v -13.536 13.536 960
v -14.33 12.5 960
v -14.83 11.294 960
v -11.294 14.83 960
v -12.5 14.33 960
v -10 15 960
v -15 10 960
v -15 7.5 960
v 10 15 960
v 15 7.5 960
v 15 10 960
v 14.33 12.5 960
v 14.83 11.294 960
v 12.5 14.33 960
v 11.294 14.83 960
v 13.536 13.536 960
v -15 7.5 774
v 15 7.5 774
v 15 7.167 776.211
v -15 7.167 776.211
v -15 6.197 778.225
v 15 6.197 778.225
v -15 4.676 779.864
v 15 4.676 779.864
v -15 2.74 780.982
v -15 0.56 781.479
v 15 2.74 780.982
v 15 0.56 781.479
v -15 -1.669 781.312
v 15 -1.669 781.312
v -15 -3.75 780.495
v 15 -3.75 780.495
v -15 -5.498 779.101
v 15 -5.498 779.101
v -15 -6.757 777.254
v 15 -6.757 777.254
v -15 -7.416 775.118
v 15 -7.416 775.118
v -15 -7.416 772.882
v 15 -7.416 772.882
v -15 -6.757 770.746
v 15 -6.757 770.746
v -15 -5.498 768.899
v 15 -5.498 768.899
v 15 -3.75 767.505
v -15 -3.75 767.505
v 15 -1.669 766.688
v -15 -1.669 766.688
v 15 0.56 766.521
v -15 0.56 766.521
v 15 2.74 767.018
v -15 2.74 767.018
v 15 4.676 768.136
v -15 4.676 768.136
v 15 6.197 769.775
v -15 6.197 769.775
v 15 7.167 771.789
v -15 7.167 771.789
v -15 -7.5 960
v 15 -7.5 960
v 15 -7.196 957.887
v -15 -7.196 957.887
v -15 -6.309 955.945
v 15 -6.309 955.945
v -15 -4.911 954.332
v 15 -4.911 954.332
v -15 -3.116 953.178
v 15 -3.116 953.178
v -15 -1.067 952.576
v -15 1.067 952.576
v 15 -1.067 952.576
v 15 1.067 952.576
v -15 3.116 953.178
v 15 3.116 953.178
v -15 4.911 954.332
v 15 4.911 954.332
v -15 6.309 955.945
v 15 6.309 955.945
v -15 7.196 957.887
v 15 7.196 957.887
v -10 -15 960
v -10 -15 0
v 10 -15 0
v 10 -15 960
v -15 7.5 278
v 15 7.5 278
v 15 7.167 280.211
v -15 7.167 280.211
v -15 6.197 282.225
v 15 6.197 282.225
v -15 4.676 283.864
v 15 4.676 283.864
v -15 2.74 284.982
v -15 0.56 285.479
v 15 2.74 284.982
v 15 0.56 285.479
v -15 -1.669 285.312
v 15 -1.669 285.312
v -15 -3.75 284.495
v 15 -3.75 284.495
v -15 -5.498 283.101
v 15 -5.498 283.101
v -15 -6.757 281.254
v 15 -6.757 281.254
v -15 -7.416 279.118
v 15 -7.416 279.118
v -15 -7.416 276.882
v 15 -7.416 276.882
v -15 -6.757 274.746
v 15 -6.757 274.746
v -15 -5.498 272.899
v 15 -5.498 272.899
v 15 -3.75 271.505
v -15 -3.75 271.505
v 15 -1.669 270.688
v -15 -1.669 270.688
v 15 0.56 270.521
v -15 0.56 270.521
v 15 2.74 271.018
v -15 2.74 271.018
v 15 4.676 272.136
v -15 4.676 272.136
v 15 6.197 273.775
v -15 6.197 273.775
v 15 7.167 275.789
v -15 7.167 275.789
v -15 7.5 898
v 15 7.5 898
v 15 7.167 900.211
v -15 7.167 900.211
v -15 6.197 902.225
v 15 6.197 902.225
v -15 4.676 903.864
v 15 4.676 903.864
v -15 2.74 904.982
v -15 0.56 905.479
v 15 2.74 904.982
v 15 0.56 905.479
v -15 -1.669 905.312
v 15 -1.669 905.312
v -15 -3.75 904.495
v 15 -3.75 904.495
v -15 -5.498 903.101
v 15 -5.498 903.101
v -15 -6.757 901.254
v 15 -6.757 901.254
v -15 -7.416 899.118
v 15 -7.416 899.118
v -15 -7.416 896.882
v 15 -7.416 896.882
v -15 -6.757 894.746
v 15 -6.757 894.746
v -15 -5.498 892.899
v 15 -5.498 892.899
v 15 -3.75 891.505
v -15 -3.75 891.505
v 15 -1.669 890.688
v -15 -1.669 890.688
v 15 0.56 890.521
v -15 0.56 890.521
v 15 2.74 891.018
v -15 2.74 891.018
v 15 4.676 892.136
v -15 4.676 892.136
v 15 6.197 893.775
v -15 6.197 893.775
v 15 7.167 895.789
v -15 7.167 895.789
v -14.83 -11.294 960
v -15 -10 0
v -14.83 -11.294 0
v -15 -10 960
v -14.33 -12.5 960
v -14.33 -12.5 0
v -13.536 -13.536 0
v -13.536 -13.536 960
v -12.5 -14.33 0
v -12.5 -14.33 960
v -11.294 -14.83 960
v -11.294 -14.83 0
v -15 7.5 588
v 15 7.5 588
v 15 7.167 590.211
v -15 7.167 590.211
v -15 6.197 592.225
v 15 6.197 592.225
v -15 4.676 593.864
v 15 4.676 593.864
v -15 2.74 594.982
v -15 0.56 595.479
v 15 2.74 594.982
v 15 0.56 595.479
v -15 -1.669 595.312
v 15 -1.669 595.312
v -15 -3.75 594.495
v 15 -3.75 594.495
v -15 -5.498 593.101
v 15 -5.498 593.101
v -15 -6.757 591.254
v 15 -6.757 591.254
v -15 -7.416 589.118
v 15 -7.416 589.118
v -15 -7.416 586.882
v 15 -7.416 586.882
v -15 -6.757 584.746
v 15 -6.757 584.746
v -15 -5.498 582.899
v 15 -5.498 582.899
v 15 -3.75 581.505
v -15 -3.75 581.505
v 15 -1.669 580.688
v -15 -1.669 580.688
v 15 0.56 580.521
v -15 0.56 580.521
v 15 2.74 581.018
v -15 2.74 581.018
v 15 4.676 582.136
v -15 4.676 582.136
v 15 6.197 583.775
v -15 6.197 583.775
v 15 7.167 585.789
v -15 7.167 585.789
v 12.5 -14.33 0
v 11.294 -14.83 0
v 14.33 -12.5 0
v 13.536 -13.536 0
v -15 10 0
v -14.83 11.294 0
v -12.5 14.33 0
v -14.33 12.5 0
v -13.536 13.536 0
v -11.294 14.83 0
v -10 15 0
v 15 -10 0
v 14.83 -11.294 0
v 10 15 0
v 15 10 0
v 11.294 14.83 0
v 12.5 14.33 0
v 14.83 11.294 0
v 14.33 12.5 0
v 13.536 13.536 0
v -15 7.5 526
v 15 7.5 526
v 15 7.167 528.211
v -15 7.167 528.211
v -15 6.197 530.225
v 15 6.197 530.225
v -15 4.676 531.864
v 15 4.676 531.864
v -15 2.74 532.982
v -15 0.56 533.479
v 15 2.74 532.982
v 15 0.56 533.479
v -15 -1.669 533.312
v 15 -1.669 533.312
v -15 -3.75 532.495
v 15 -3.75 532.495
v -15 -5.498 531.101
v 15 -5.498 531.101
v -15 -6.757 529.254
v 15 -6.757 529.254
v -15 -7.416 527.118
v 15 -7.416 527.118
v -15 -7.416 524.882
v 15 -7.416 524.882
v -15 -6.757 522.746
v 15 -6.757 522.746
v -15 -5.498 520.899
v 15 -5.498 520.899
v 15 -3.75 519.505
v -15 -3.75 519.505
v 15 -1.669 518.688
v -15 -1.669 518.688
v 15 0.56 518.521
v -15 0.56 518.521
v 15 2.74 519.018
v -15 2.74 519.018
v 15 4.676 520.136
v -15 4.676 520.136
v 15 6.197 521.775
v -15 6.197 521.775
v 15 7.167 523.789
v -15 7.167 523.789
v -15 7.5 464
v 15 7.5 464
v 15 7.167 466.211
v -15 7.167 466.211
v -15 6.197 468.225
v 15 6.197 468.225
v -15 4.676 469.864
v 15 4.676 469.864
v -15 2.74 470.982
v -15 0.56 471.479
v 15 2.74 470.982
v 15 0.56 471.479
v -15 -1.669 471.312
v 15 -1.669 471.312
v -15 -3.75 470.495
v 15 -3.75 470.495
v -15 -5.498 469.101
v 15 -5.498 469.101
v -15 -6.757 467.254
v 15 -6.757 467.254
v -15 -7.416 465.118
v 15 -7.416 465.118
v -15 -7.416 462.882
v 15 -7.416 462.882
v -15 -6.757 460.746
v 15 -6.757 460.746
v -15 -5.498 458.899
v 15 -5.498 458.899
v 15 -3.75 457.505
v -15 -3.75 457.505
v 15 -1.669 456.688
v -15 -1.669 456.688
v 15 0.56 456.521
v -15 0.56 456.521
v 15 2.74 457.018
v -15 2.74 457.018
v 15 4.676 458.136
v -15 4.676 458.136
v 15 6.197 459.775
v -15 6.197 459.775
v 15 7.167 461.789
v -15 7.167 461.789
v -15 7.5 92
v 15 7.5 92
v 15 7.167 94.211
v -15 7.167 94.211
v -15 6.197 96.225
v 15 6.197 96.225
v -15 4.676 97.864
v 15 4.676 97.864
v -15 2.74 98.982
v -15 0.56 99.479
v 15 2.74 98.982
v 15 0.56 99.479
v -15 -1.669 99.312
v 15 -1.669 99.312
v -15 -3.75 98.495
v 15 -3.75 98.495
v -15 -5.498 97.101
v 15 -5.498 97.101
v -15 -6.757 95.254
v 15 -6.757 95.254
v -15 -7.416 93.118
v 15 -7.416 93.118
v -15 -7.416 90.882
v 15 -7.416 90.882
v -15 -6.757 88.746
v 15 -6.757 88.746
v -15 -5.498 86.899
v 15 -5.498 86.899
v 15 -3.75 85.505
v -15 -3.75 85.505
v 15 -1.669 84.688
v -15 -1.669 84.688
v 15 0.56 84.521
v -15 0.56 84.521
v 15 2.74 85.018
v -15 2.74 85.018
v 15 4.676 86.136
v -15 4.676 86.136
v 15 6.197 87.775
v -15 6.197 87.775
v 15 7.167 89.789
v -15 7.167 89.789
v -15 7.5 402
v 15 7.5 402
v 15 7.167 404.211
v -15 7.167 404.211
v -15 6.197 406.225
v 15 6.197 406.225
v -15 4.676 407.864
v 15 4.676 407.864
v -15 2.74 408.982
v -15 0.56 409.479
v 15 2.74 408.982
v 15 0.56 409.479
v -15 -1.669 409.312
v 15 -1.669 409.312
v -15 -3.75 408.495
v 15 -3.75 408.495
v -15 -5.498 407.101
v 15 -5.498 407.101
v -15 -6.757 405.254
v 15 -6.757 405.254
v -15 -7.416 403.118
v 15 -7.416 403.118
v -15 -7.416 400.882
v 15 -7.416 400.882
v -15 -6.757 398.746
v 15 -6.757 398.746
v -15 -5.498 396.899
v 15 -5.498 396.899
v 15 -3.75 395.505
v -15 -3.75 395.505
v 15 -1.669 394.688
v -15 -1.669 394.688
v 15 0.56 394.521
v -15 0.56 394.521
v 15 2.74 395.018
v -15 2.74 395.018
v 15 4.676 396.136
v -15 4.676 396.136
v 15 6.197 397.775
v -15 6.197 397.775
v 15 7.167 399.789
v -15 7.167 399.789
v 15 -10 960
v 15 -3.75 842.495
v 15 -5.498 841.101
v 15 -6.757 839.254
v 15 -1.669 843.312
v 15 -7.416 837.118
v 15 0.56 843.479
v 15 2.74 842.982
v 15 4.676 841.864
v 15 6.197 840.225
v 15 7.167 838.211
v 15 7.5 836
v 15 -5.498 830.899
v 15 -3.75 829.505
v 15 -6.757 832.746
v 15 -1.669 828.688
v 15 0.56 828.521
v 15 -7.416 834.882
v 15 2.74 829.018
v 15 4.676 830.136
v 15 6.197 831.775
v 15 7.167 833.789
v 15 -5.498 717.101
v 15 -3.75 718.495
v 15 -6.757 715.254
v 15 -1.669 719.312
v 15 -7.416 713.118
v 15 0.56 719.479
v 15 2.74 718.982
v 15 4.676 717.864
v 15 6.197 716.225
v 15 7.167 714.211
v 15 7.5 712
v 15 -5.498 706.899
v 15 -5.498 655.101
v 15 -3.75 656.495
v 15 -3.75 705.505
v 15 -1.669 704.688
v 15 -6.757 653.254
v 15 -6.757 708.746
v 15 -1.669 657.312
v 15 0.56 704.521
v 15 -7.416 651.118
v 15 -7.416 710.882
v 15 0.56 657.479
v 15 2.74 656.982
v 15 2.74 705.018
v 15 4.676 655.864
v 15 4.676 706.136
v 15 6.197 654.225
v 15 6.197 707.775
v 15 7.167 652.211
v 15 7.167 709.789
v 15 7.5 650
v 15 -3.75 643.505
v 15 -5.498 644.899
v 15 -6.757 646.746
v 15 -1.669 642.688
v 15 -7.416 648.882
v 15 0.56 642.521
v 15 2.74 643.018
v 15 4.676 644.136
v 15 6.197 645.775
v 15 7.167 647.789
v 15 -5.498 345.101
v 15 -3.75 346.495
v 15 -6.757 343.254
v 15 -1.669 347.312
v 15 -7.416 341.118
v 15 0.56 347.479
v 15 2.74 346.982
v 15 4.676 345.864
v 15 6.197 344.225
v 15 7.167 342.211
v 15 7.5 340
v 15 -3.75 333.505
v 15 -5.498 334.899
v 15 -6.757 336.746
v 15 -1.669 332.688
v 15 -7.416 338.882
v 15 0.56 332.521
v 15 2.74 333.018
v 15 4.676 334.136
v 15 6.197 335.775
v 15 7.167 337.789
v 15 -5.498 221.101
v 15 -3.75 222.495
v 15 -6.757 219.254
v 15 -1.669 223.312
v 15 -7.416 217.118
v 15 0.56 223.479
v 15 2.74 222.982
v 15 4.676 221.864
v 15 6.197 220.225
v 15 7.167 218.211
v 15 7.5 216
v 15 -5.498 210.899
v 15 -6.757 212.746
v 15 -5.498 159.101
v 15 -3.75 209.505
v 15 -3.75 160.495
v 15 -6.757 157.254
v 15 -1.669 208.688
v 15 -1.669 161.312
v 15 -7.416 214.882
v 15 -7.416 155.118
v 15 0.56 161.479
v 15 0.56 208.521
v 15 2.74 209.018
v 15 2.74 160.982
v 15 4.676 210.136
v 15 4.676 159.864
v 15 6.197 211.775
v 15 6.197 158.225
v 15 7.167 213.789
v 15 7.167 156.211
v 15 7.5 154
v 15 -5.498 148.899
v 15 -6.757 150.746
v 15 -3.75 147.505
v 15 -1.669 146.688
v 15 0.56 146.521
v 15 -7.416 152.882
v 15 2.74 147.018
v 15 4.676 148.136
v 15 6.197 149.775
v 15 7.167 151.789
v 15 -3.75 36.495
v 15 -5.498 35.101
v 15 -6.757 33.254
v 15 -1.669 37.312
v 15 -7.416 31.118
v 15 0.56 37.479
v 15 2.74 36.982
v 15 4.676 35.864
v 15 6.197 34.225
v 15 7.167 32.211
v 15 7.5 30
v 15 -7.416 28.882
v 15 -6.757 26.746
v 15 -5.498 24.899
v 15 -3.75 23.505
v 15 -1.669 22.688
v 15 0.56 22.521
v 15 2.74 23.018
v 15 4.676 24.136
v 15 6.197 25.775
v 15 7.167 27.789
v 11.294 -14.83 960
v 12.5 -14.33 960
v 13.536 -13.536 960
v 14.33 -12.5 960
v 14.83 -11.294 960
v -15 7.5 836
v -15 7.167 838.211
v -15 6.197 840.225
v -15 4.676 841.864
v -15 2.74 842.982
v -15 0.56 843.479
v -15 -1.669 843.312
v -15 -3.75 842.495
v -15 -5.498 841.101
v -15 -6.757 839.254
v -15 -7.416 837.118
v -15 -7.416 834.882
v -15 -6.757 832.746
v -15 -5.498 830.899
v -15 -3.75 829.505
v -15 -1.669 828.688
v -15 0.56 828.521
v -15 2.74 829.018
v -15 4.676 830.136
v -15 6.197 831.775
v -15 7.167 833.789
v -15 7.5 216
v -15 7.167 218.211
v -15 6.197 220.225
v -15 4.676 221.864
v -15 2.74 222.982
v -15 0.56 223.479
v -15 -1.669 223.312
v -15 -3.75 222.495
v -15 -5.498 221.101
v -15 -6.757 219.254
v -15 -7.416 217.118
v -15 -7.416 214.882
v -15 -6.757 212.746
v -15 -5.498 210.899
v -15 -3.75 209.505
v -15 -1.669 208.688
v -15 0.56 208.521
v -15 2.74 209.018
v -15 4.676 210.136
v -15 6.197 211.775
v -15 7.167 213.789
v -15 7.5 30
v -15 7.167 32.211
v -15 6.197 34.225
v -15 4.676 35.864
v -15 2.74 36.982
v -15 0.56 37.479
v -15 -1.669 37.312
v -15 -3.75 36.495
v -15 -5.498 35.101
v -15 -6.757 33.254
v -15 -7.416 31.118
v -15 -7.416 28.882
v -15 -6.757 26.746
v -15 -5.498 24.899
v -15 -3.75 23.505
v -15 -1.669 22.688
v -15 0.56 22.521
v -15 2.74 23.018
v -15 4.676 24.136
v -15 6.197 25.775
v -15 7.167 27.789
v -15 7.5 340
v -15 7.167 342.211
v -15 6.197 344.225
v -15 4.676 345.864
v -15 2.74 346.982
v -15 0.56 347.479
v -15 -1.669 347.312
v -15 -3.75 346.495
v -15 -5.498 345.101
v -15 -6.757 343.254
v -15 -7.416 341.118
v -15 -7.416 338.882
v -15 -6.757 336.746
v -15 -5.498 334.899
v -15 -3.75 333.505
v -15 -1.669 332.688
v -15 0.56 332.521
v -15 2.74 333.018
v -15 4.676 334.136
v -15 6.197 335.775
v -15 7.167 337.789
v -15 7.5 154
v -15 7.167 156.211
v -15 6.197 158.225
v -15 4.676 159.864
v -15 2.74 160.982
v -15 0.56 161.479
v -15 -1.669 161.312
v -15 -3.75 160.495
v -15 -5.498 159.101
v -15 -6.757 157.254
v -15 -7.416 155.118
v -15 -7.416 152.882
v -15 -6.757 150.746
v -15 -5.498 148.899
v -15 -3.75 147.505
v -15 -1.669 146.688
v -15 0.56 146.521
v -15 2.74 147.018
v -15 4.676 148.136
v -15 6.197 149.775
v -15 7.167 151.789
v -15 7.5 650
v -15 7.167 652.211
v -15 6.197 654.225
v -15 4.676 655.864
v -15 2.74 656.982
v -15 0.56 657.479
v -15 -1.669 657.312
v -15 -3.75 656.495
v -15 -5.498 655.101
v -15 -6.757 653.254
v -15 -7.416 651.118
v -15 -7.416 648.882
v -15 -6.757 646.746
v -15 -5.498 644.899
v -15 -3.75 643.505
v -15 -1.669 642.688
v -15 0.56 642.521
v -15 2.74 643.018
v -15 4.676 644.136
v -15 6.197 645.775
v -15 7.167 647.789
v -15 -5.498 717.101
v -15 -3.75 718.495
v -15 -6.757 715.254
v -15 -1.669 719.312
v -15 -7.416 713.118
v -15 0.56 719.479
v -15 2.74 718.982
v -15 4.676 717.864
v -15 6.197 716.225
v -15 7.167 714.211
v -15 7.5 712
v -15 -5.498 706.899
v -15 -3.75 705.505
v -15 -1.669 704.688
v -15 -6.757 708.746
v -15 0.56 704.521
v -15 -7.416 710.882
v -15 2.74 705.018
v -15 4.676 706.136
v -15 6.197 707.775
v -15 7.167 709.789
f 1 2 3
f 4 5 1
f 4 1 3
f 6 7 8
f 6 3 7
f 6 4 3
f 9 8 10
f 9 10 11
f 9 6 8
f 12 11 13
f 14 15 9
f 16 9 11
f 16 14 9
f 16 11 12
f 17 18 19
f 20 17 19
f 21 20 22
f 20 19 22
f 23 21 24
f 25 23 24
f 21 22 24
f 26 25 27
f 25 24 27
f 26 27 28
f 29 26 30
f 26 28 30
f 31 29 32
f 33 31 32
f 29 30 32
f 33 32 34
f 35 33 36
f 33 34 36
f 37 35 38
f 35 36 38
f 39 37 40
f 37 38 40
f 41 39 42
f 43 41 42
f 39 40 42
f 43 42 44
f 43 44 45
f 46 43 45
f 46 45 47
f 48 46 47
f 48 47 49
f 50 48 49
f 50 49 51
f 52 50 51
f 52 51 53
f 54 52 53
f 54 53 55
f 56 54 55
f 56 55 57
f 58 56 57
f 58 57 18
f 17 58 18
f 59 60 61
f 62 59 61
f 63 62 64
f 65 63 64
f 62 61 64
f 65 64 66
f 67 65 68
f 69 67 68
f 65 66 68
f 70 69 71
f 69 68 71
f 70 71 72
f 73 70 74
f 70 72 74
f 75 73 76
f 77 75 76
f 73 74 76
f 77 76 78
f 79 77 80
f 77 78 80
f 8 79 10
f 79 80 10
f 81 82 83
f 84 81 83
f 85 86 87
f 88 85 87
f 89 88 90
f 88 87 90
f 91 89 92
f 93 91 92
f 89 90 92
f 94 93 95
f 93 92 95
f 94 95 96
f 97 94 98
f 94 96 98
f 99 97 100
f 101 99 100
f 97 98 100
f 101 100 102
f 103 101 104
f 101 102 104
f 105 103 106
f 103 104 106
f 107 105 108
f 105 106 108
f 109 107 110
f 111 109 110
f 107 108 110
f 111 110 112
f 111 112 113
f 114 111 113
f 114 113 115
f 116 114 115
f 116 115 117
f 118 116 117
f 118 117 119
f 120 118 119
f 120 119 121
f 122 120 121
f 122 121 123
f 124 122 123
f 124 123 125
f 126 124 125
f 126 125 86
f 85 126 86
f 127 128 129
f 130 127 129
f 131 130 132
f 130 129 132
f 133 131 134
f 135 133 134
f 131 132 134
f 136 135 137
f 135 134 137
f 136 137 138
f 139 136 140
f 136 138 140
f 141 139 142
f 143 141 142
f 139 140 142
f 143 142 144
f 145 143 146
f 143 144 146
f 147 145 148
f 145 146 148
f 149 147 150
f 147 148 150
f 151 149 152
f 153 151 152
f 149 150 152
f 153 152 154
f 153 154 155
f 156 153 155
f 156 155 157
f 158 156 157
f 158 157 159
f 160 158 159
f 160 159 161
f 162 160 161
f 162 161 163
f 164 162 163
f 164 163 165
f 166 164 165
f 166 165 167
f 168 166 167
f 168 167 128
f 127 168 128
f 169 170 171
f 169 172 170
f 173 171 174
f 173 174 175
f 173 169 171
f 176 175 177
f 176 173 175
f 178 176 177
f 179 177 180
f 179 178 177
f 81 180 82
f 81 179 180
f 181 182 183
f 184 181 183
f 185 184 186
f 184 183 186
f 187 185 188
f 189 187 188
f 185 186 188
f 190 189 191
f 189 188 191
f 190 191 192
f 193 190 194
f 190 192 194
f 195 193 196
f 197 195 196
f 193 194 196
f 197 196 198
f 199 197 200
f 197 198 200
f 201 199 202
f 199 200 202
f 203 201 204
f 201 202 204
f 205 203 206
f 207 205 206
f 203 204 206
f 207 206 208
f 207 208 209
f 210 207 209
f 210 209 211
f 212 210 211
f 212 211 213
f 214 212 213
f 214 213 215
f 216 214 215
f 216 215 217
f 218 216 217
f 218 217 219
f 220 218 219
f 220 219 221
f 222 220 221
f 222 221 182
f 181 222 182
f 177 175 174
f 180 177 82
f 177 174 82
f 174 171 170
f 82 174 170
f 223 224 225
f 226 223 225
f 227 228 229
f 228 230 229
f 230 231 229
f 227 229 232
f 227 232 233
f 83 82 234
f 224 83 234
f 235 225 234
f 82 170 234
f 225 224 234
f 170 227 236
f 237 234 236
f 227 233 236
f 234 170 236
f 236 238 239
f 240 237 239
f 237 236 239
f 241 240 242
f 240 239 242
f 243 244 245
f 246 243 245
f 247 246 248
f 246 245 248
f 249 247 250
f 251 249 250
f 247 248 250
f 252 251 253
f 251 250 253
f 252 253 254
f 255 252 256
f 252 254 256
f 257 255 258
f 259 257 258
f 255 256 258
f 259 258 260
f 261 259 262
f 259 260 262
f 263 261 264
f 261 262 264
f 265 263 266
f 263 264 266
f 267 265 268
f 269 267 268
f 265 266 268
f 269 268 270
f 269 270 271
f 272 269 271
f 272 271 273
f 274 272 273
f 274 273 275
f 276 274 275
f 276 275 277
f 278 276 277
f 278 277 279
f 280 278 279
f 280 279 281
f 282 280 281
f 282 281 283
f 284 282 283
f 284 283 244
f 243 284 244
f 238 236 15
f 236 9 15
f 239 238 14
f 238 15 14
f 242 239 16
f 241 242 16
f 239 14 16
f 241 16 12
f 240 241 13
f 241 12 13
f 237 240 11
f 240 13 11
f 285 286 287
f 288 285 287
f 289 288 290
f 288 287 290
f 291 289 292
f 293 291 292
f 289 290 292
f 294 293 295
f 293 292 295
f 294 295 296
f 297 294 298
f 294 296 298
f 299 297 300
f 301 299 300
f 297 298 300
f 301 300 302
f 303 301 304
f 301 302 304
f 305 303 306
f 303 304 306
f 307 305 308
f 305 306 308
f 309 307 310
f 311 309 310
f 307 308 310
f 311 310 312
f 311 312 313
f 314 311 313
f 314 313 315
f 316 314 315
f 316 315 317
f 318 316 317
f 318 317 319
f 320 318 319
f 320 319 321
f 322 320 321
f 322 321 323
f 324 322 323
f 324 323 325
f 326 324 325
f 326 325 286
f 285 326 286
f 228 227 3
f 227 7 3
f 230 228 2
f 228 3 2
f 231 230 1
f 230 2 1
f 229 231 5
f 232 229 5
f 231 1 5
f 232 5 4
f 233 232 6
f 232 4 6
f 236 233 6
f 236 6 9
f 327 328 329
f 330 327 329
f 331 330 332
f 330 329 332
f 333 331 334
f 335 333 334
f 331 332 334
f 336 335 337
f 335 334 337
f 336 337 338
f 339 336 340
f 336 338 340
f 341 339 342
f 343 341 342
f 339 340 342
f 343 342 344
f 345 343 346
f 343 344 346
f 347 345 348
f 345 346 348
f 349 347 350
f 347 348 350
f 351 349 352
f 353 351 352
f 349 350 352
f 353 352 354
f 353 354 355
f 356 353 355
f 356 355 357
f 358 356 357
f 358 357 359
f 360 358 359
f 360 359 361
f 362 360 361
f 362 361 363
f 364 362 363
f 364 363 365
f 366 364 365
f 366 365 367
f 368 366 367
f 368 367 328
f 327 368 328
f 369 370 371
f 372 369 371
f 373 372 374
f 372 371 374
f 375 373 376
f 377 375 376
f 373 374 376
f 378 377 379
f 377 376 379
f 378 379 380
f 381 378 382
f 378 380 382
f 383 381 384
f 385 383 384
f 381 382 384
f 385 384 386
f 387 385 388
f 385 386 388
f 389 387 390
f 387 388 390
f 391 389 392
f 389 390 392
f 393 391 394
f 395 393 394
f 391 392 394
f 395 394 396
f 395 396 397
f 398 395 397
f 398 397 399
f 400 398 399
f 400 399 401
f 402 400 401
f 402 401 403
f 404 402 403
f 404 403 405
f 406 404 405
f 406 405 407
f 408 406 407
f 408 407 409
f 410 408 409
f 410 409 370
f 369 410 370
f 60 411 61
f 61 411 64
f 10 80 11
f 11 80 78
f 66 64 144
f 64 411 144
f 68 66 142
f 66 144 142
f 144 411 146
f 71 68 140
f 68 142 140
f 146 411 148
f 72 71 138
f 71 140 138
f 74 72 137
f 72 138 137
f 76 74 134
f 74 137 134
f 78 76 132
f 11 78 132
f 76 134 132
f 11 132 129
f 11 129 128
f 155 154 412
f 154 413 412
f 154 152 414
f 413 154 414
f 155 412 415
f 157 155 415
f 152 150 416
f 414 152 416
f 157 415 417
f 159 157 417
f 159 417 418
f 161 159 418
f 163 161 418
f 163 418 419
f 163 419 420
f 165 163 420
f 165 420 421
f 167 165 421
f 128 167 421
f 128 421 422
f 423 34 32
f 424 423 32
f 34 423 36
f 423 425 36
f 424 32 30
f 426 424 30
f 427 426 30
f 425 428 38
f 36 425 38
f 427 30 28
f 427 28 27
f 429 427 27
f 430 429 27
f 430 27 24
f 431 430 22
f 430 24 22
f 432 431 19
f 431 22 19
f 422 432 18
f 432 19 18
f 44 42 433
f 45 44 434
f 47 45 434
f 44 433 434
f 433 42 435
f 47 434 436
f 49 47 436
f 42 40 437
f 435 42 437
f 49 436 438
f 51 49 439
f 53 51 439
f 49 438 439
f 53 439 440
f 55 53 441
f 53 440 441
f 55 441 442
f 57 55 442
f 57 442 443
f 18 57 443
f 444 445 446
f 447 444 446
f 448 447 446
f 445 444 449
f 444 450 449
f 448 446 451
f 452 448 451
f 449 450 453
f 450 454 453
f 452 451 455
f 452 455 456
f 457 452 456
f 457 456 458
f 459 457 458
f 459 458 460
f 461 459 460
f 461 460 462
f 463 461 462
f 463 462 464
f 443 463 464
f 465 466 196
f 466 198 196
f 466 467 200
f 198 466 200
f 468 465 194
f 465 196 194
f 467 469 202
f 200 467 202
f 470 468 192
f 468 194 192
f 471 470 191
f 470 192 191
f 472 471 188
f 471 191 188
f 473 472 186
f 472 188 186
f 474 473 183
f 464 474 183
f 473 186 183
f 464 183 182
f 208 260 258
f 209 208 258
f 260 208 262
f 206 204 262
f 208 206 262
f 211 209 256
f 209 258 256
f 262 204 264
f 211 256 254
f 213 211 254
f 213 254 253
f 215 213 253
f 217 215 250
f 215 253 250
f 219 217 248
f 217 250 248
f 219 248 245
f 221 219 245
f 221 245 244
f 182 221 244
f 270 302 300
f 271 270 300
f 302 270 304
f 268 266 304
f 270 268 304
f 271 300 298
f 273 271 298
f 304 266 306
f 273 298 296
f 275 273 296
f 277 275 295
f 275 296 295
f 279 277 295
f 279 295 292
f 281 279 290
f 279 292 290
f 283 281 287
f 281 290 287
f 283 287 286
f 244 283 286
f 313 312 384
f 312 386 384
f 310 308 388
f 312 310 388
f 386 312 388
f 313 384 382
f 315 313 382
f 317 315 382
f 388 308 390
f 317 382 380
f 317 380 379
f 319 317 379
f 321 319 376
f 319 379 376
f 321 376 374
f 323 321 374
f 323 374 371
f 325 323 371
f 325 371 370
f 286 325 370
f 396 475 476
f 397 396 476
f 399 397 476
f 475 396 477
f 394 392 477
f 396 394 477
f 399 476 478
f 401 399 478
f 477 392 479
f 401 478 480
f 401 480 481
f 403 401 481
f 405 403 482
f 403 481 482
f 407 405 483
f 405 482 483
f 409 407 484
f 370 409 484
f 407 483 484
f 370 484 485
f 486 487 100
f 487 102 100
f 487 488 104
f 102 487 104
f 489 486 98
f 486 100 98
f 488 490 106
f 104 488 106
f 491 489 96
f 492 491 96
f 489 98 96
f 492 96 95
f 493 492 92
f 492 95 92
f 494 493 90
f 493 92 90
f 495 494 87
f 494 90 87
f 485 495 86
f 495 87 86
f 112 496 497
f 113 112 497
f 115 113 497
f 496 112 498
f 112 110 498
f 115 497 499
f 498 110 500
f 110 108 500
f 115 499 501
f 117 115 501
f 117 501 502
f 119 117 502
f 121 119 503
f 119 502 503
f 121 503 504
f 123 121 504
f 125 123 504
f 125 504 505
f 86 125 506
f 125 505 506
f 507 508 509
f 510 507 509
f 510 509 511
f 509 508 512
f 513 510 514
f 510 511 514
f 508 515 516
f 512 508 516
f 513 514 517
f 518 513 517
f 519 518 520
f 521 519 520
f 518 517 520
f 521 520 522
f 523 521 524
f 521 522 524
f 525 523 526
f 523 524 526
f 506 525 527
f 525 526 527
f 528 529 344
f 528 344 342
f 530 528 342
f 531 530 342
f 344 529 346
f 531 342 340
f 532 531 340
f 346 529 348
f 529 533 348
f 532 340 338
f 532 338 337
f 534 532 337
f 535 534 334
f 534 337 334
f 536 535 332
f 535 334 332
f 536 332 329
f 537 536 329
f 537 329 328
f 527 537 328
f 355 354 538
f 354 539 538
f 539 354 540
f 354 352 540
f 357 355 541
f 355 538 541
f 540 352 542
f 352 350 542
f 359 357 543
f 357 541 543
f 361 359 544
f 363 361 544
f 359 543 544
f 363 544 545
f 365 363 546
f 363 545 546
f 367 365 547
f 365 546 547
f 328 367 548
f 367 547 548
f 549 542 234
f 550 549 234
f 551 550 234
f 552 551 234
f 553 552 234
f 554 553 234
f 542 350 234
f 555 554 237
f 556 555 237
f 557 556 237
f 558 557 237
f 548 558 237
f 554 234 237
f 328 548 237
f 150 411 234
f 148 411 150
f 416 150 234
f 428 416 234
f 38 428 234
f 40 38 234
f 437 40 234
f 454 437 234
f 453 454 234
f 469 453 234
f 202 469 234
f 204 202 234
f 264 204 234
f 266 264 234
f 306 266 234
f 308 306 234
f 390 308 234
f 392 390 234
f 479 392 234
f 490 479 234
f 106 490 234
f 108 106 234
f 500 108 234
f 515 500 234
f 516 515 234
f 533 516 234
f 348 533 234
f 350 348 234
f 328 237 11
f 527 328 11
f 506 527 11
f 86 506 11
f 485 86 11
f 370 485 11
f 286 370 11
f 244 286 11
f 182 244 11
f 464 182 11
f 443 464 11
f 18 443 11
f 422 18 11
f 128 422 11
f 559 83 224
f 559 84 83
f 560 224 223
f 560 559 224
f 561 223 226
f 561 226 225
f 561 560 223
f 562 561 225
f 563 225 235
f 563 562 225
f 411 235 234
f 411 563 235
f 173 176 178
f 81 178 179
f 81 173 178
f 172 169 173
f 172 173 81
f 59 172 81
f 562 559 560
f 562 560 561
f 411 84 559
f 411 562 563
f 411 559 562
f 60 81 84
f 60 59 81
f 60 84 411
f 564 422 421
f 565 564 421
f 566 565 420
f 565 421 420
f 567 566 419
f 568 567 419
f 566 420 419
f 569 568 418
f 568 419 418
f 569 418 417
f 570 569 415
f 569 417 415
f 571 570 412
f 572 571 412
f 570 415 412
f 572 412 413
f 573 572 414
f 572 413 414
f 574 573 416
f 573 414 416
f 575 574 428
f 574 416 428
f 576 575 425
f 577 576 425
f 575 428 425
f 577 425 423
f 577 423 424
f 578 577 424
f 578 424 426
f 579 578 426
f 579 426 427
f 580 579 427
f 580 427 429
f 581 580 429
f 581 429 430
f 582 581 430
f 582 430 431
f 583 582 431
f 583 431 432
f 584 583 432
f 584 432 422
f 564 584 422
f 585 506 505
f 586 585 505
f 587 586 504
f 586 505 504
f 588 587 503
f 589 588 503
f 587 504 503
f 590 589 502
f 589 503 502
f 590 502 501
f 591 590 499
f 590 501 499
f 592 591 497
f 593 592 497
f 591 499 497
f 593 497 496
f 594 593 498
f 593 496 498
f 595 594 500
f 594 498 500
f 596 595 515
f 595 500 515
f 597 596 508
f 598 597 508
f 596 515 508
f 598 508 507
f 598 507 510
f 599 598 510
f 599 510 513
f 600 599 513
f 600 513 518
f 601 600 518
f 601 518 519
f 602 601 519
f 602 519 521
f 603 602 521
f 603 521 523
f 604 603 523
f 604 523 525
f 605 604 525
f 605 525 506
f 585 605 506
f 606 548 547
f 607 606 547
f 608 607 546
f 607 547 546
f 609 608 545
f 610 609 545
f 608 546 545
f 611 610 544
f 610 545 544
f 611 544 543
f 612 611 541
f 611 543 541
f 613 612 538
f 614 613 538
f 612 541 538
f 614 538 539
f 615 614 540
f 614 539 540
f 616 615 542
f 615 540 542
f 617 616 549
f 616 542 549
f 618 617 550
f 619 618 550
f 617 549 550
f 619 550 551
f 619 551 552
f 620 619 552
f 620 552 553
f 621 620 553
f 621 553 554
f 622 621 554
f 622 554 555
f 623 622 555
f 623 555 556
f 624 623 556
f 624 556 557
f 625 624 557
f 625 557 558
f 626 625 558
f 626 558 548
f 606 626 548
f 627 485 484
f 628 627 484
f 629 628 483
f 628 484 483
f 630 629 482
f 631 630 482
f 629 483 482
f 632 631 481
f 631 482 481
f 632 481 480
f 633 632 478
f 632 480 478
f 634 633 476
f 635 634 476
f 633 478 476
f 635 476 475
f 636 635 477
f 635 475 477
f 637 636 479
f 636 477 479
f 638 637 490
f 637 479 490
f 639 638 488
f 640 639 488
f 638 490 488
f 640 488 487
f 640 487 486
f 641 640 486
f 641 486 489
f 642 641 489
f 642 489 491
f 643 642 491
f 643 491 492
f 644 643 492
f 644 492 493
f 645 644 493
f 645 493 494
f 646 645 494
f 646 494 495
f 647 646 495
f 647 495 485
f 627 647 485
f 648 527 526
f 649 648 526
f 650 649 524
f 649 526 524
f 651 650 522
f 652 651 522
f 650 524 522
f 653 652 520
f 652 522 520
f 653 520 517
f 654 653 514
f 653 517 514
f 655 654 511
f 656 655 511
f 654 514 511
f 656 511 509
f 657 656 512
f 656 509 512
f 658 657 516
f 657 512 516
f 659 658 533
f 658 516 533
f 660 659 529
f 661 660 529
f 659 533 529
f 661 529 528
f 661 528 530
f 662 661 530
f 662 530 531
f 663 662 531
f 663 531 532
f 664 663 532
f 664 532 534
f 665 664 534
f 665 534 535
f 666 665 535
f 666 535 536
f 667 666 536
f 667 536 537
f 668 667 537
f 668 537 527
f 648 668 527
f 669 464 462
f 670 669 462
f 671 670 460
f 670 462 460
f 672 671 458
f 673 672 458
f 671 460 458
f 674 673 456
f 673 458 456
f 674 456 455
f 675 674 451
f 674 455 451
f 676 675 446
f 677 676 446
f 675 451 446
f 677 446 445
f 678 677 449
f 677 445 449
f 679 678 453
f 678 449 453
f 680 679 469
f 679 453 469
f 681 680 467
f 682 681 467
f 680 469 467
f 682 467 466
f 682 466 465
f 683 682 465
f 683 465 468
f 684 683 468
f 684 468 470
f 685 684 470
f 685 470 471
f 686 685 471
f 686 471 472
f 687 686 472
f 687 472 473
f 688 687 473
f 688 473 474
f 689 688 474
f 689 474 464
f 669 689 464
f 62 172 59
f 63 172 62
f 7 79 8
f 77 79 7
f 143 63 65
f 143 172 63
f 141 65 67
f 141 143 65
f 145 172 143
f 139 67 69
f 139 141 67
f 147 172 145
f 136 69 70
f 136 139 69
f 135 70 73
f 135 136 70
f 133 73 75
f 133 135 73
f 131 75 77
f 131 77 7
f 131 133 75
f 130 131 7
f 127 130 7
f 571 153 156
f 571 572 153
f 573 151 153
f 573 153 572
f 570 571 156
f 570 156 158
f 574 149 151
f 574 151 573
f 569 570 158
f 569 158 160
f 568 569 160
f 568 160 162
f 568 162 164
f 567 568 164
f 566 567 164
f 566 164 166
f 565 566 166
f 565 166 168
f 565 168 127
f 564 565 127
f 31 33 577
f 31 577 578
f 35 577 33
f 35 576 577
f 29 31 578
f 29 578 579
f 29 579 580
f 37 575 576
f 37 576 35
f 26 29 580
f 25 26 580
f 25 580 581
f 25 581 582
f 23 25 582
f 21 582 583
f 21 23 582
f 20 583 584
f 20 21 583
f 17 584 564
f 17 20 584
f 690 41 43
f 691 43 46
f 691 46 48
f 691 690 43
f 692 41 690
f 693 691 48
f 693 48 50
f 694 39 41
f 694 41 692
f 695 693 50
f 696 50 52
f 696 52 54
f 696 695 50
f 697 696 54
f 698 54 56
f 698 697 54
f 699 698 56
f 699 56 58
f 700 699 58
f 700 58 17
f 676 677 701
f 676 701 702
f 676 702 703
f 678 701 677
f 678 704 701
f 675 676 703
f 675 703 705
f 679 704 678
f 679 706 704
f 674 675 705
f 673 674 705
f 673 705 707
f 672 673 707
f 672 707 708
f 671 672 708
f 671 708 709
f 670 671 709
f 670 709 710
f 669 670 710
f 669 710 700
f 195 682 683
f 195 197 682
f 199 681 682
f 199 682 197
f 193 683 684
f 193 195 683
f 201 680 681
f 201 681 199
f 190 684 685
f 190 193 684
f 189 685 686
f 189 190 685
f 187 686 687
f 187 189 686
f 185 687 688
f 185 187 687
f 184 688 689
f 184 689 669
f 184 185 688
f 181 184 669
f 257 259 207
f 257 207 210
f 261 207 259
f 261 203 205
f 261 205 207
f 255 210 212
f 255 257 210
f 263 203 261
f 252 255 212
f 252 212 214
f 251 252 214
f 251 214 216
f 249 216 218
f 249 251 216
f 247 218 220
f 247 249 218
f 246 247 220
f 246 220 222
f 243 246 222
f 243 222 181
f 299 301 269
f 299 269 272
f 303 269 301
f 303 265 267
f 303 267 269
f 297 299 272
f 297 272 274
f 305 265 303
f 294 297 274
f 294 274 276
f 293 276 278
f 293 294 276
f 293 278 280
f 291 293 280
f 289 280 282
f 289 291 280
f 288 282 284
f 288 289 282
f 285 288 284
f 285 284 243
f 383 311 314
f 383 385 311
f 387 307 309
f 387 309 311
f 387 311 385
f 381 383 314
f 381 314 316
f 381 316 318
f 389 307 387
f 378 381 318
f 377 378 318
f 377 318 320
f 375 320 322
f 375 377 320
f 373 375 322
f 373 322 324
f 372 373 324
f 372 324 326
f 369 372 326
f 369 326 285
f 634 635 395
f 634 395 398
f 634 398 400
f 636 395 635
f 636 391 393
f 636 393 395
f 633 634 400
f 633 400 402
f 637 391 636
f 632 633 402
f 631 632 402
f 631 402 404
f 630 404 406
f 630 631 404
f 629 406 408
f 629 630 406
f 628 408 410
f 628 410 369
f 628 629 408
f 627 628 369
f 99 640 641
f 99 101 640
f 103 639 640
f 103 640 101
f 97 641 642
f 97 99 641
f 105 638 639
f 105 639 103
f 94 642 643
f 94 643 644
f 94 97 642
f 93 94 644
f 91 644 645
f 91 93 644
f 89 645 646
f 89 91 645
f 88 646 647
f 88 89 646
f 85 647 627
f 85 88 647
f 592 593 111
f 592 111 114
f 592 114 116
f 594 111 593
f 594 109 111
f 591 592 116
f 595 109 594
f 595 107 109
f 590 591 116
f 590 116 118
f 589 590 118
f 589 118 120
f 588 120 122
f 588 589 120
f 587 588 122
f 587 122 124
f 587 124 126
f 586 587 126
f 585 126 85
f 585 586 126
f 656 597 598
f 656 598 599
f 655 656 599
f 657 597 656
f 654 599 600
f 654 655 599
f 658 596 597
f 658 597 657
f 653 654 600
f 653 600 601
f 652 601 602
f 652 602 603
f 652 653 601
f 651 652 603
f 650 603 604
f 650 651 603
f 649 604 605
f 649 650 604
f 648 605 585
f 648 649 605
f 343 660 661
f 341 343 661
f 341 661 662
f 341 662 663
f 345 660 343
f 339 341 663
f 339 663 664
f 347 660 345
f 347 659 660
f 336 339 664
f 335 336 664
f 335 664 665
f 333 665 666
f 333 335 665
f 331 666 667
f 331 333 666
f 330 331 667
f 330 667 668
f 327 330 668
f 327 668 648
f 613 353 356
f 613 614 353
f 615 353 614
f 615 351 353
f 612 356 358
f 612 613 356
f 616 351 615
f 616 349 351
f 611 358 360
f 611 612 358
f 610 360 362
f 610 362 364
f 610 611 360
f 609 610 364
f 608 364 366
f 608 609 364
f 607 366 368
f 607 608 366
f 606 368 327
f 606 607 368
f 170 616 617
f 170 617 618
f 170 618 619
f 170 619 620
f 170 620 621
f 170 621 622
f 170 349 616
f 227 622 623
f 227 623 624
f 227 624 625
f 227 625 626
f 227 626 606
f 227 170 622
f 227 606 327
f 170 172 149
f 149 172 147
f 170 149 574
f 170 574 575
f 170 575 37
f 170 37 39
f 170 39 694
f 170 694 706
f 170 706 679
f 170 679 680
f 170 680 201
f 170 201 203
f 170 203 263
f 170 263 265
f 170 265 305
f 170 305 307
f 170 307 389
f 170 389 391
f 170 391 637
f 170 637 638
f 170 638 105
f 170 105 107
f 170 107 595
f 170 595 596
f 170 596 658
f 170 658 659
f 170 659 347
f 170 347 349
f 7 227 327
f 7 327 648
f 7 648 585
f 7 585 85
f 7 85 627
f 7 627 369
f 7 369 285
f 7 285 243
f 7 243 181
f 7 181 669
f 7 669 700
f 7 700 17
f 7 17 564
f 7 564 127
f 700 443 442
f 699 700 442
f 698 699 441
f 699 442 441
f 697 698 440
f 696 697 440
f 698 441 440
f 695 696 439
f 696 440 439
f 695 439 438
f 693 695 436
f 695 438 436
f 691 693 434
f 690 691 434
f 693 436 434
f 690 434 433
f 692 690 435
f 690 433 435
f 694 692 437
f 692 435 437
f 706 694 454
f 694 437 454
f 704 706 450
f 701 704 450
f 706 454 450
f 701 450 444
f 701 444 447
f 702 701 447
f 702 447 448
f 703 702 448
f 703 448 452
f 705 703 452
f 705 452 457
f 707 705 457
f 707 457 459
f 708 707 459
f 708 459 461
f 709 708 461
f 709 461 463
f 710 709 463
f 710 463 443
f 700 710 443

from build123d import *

# Parameters (mm, degrees)
F0_W     = 30
F0_H     = 30
F1_DEPTH = 960
F2_R     = 7.5
F3_DEPTH = 30.001
F4_R     = 5


with BuildPart() as f1:
    # F0 (on Top) → F1 (new body)
    with BuildSketch(Plane.XY):
        Rectangle(F0_W, F0_H)
    extrude(amount=F1_DEPTH)

    # F2 (on face) → F3 (cut, through all)
    with BuildSketch(Plane.YZ.offset(15)):
        with Locations((0, 30)):
            Circle(F2_R)
        with Locations((0, 92)):
            Circle(F2_R)
        with Locations((0, 154)):
            Circle(F2_R)
        with Locations((0, 216)):
            Circle(F2_R)
        with Locations((0, 278)):
            Circle(F2_R)
        with Locations((0, 340)):
            Circle(F2_R)
        with Locations((0, 402)):
            Circle(F2_R)
        with Locations((0, 464)):
            Circle(F2_R)
        with Locations((0, 526)):
            Circle(F2_R)
        with Locations((0, 588)):
            Circle(F2_R)
        with Locations((0, 650)):
            Circle(F2_R)
        with Locations((0, 712)):
            Circle(F2_R)
        with Locations((0, 774)):
            Circle(F2_R)
        with Locations((0, 836)):
            Circle(F2_R)
        with Locations((0, 898)):
            Circle(F2_R)
        with Locations((0, 960)):
            Circle(F2_R)
        with Locations((0, 1022)):
            Circle(F2_R)
        with Locations((0, 1084)):
            Circle(F2_R)
        with Locations((0, 1146)):
            Circle(F2_R)
        with Locations((0, 1208)):
            Circle(F2_R)
        with Locations((0, 1270)):
            Circle(F2_R)
        with Locations((0, 1332)):
            Circle(F2_R)
        with Locations((0, 1394)):
            Circle(F2_R)
        with Locations((0, 1456)):
            Circle(F2_R)
        with Locations((0, 1518)):
            Circle(F2_R)
        with Locations((0, 1580)):
            Circle(F2_R)
        with Locations((0, 1642)):
            Circle(F2_R)
        with Locations((0, 1704)):
            Circle(F2_R)
    extrude(amount=-F3_DEPTH, mode=Mode.SUBTRACT)

    # F4
    f4_edges = [f1.edges().sort_by_distance(p)[0] for p in [
        (15, -15, 480),
        (-15, -15, 480),
        (15, 15, 480),
        (-15, 15, 480),
    ]]
    fillet(f4_edges, radius=F4_R)


solid = f1.part
